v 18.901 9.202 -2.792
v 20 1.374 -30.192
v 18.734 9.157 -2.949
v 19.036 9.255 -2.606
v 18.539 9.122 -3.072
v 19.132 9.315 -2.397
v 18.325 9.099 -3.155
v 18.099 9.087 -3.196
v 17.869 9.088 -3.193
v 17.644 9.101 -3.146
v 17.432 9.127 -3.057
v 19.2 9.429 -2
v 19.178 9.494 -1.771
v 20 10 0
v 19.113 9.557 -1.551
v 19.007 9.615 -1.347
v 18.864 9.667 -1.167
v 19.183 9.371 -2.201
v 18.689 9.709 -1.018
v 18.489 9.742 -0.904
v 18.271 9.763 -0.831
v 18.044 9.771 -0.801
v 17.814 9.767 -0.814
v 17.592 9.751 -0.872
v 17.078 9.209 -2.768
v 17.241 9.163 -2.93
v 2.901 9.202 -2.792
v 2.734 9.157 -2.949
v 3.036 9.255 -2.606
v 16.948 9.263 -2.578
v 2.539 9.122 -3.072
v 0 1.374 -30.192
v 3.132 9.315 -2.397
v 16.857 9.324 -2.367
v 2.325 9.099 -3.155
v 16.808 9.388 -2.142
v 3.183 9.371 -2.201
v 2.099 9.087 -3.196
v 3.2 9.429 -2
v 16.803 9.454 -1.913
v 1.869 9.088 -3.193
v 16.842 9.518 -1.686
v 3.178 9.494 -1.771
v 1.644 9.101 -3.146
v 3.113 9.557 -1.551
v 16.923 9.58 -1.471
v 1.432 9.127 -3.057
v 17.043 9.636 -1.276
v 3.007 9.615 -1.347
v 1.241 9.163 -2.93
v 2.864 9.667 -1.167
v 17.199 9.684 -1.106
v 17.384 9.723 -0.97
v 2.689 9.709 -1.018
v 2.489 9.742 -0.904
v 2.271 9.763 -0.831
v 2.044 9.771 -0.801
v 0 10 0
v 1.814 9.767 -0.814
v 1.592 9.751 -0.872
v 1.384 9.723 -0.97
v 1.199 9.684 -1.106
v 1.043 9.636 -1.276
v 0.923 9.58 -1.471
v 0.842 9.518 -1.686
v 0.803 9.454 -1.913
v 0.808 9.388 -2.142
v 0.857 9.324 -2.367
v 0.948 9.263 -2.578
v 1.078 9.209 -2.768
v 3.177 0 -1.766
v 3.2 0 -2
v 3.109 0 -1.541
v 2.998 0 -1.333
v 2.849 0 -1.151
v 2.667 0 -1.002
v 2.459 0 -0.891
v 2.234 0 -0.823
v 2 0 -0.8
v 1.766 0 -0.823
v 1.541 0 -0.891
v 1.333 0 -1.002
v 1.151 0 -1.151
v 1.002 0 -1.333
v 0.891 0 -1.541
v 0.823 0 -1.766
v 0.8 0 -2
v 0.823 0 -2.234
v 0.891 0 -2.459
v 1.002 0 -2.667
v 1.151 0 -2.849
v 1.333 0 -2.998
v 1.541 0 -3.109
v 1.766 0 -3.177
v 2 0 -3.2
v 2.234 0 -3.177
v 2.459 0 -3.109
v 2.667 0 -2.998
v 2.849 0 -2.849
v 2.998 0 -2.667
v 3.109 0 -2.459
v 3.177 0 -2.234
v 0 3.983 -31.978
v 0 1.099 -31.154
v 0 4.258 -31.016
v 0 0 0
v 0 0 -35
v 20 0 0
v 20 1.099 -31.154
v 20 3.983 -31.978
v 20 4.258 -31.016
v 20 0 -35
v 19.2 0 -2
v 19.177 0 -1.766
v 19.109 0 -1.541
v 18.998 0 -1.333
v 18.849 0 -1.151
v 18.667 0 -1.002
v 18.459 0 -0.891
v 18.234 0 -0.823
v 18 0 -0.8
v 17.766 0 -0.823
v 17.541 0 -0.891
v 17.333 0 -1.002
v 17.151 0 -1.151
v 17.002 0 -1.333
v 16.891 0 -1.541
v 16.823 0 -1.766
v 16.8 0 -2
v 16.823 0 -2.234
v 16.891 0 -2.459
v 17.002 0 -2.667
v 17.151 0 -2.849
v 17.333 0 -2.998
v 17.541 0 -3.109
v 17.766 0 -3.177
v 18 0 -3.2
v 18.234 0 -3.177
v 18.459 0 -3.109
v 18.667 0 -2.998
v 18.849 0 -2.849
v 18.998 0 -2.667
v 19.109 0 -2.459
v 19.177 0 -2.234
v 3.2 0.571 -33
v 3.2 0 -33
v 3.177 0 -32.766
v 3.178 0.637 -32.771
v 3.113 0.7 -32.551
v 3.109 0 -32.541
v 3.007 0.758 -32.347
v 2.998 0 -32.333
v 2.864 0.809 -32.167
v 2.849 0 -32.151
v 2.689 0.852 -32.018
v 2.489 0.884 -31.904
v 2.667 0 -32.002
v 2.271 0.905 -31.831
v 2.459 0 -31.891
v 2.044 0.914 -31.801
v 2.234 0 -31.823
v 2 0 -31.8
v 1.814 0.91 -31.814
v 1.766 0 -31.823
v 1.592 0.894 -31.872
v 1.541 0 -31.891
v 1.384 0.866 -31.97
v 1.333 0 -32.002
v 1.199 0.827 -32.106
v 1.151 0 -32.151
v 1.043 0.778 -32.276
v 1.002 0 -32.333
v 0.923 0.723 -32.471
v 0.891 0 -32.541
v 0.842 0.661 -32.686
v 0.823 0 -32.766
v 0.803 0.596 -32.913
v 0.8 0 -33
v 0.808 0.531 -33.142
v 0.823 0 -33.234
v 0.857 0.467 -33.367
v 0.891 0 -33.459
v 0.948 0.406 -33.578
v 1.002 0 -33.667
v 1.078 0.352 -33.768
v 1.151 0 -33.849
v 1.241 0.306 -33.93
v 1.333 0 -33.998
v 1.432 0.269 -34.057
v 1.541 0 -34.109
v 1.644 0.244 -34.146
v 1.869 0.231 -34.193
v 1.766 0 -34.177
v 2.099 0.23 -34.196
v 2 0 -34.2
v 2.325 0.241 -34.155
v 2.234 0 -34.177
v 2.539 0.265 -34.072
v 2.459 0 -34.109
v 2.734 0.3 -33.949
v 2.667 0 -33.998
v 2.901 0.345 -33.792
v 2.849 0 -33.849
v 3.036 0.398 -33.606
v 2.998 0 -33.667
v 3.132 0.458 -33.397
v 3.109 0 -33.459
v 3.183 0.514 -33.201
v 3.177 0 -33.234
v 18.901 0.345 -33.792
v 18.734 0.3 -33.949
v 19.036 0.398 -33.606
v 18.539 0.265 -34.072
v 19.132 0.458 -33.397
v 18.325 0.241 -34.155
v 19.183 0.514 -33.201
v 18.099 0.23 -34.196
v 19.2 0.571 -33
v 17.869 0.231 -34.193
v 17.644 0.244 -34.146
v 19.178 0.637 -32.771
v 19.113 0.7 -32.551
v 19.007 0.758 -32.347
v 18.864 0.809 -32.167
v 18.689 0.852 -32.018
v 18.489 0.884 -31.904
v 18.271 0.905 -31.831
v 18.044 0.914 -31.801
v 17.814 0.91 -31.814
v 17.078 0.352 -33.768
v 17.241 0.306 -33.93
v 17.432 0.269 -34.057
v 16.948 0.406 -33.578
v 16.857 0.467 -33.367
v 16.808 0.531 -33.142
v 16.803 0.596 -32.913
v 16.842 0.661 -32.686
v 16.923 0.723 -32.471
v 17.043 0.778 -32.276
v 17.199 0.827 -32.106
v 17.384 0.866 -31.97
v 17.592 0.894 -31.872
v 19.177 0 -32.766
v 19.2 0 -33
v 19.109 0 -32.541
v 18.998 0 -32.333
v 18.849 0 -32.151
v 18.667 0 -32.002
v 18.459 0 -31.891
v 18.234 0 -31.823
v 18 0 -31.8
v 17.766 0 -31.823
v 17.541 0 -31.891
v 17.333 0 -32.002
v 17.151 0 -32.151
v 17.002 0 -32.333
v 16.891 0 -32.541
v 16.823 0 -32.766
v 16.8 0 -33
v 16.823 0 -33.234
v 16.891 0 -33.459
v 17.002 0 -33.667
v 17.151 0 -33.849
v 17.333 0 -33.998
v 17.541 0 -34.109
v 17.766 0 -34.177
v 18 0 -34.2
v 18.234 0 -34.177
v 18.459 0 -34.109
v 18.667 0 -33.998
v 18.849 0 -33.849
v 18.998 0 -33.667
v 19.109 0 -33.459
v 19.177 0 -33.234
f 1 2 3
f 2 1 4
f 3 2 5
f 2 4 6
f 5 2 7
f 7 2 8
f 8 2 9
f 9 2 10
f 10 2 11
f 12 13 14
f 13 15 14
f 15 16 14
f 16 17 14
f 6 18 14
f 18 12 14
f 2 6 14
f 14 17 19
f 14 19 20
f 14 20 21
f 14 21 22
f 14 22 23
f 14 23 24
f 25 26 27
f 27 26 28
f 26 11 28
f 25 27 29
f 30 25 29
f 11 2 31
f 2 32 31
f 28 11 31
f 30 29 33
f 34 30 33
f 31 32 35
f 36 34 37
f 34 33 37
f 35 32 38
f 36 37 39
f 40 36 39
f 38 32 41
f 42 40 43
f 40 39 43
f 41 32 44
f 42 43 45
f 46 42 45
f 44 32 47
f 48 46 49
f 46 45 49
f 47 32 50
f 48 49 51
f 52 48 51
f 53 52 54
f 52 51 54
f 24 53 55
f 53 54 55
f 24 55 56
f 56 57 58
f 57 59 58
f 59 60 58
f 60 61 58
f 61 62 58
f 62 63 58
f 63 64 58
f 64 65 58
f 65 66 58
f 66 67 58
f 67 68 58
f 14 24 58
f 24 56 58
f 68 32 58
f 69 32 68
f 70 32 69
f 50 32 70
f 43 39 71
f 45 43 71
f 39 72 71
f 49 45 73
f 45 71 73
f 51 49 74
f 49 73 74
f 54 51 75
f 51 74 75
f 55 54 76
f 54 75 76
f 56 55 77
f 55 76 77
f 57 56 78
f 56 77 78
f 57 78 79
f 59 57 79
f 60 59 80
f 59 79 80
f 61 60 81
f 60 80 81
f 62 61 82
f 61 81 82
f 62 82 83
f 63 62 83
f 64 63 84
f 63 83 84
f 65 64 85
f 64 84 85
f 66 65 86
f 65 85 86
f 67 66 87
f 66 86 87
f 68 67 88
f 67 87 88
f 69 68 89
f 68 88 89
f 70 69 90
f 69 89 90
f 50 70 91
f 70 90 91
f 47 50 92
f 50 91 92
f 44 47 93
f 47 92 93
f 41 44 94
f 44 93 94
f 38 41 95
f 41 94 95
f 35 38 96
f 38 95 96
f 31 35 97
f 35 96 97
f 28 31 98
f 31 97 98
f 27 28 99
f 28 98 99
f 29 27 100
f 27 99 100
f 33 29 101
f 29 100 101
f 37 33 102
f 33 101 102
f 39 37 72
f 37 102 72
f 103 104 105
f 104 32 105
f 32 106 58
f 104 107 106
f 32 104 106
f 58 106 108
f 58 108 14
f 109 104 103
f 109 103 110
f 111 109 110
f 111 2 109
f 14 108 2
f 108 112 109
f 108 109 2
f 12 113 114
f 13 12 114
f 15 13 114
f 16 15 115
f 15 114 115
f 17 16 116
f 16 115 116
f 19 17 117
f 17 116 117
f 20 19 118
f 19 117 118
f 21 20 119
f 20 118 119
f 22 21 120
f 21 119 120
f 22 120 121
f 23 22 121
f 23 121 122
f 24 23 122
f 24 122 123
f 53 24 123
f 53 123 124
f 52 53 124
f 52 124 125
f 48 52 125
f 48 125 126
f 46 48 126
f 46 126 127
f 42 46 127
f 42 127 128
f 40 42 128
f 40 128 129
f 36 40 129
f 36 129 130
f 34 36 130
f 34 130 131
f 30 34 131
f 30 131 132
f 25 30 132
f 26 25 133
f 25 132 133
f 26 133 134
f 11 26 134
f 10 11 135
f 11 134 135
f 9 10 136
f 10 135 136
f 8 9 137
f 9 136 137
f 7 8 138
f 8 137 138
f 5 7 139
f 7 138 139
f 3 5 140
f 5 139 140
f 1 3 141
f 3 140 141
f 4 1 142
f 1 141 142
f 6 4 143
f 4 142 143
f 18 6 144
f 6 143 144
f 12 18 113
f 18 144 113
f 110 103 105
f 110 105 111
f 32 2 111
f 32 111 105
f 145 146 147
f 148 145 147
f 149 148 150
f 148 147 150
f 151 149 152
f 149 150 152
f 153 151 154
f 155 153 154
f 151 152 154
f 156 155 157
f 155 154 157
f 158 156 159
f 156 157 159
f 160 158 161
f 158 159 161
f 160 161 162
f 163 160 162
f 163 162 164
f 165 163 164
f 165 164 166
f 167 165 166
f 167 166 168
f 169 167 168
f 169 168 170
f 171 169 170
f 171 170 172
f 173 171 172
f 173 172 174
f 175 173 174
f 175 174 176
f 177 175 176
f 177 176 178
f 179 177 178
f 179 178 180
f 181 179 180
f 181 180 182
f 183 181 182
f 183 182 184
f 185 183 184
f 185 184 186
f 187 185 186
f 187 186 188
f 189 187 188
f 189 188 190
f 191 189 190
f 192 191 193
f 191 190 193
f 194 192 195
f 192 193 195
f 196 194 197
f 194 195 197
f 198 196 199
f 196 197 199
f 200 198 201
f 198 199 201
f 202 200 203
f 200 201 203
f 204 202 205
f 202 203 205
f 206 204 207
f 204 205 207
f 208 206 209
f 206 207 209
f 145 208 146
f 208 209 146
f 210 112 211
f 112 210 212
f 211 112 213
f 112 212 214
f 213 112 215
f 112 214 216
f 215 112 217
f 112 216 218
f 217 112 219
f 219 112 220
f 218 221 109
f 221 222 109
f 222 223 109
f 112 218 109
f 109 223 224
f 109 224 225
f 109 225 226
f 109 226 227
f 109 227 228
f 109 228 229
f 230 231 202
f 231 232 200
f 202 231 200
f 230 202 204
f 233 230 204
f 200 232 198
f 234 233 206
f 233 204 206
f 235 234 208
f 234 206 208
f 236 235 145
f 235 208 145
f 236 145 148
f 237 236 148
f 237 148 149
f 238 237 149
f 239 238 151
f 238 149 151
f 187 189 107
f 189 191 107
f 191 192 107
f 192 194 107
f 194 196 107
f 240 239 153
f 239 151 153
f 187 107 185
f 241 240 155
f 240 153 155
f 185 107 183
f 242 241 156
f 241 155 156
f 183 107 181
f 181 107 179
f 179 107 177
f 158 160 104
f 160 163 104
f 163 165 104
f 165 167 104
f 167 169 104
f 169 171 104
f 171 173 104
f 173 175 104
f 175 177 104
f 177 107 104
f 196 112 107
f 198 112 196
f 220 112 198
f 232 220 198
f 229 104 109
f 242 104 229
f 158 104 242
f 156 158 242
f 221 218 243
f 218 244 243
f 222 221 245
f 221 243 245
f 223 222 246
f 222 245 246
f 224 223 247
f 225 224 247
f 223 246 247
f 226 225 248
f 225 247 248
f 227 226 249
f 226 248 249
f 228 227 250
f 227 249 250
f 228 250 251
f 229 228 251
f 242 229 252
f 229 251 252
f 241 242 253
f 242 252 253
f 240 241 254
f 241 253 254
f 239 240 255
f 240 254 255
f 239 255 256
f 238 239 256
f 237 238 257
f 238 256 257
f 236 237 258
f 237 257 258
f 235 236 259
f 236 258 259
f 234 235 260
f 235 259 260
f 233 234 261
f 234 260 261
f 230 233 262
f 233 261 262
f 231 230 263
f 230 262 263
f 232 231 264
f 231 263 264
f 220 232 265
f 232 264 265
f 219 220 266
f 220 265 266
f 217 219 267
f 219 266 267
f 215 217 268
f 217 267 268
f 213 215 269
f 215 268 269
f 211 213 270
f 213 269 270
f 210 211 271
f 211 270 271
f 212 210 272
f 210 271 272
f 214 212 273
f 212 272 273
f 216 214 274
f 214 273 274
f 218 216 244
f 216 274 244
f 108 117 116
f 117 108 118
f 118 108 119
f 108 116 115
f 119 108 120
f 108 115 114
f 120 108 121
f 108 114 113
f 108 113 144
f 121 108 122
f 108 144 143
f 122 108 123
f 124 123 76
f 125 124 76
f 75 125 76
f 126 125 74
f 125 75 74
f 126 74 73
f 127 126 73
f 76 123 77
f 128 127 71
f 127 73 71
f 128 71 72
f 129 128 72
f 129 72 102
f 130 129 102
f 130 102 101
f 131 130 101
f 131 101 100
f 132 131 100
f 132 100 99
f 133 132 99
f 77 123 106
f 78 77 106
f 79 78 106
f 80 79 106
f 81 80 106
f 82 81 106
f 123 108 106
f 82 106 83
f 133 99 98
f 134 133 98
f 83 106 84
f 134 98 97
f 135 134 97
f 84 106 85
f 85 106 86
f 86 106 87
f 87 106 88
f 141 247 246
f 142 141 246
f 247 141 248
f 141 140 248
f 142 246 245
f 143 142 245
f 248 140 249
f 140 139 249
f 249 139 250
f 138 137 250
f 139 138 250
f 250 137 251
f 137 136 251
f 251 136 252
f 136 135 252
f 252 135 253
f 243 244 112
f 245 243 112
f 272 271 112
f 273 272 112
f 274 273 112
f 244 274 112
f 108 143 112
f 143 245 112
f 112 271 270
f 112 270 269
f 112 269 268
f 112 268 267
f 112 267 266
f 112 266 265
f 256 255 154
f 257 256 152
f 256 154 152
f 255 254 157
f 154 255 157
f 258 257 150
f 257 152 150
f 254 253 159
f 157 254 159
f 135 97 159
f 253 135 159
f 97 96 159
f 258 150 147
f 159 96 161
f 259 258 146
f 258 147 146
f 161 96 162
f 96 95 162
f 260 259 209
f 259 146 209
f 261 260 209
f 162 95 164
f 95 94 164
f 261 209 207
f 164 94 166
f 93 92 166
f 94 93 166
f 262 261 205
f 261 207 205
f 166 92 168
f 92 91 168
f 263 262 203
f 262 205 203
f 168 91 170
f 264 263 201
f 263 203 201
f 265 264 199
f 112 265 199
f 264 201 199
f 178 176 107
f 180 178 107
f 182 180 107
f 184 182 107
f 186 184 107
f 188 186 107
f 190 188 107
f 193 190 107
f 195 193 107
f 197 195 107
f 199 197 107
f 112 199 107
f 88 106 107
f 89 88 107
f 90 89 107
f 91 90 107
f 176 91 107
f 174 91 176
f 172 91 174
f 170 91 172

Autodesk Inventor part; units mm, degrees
ref_plane "YZ Plane" through (0, 0, 0) normal (1, 0, 0) x (0, 1, 0)
ref_plane "XZ Plane" through (0, 0, 0) normal (0, 1, 0) x (-1, 0, 0)
ref_plane "XY Plane" through (0, 0, 0) normal (0, 0, 1) x (1, 0, 0)
sketch "Sketch1" plane through (0, 0, 0) normal (1, 0, 0) x (0, 1, 0)
  line L0 (0, 0) -> (10, 0)
  line L1 (0, 0) -> (0, -35)
  line L2 (0, -35) -> (10, 0)
  dimension "d0" = 10
  dimension "d1" = 35
extrude "Extrusion1" add sketch "Sketch1" along normal blind 20
sketch "Sketch2" plane through (0, 0, -35) normal (0, -1, 0) x (1, 0, 0)
  line L0 (0, 35) -> (20, 35) projected
  circle A0 centre (18, 33) radius 1.2
  line L1 (0, 35) -> (0, 0) projected
  circle A1 centre (2, 33) radius 1.2
  line L2 (20, 35) -> (20, 0) projected
  circle A2 centre (18, 2) radius 1.2
  circle A3 centre (2, 2) radius 1.2
  dimension "d6" = 2.4
  dimension "d8" = 2.4
  dimension "d12" = 2.4
  dimension "d13" = 2.4
extrude "Extrusion2" cut sketch "Sketch2" against normal through all
sketch "Sketch3" plane through (0, 10, 0) normal (0, 0.9615239, -0.2747211) x (1, 0, 0)
  line L0 (0, 2.7472) -> (0, 36.4005) projected
  line L1 (0, 36.4005) -> (0, 32.4005)
  line L2 (20, 2.7472) -> (20, 36.4005) projected
  line L3 (0, 32.4005) -> (20, 32.4005)
  line L4 (20, 32.4005) -> (20, 31.4005)
  line L5 (20, 31.4005) -> (0, 31.4005)
  line L6 (0, 31.4005) -> (0, 32.4005)
  dimension "d16" = 4
  dimension "d17" = 1
extrude "Extrusion3" add sketch "Sketch3" along normal blind 3
properties part number "1_mm_slant"
